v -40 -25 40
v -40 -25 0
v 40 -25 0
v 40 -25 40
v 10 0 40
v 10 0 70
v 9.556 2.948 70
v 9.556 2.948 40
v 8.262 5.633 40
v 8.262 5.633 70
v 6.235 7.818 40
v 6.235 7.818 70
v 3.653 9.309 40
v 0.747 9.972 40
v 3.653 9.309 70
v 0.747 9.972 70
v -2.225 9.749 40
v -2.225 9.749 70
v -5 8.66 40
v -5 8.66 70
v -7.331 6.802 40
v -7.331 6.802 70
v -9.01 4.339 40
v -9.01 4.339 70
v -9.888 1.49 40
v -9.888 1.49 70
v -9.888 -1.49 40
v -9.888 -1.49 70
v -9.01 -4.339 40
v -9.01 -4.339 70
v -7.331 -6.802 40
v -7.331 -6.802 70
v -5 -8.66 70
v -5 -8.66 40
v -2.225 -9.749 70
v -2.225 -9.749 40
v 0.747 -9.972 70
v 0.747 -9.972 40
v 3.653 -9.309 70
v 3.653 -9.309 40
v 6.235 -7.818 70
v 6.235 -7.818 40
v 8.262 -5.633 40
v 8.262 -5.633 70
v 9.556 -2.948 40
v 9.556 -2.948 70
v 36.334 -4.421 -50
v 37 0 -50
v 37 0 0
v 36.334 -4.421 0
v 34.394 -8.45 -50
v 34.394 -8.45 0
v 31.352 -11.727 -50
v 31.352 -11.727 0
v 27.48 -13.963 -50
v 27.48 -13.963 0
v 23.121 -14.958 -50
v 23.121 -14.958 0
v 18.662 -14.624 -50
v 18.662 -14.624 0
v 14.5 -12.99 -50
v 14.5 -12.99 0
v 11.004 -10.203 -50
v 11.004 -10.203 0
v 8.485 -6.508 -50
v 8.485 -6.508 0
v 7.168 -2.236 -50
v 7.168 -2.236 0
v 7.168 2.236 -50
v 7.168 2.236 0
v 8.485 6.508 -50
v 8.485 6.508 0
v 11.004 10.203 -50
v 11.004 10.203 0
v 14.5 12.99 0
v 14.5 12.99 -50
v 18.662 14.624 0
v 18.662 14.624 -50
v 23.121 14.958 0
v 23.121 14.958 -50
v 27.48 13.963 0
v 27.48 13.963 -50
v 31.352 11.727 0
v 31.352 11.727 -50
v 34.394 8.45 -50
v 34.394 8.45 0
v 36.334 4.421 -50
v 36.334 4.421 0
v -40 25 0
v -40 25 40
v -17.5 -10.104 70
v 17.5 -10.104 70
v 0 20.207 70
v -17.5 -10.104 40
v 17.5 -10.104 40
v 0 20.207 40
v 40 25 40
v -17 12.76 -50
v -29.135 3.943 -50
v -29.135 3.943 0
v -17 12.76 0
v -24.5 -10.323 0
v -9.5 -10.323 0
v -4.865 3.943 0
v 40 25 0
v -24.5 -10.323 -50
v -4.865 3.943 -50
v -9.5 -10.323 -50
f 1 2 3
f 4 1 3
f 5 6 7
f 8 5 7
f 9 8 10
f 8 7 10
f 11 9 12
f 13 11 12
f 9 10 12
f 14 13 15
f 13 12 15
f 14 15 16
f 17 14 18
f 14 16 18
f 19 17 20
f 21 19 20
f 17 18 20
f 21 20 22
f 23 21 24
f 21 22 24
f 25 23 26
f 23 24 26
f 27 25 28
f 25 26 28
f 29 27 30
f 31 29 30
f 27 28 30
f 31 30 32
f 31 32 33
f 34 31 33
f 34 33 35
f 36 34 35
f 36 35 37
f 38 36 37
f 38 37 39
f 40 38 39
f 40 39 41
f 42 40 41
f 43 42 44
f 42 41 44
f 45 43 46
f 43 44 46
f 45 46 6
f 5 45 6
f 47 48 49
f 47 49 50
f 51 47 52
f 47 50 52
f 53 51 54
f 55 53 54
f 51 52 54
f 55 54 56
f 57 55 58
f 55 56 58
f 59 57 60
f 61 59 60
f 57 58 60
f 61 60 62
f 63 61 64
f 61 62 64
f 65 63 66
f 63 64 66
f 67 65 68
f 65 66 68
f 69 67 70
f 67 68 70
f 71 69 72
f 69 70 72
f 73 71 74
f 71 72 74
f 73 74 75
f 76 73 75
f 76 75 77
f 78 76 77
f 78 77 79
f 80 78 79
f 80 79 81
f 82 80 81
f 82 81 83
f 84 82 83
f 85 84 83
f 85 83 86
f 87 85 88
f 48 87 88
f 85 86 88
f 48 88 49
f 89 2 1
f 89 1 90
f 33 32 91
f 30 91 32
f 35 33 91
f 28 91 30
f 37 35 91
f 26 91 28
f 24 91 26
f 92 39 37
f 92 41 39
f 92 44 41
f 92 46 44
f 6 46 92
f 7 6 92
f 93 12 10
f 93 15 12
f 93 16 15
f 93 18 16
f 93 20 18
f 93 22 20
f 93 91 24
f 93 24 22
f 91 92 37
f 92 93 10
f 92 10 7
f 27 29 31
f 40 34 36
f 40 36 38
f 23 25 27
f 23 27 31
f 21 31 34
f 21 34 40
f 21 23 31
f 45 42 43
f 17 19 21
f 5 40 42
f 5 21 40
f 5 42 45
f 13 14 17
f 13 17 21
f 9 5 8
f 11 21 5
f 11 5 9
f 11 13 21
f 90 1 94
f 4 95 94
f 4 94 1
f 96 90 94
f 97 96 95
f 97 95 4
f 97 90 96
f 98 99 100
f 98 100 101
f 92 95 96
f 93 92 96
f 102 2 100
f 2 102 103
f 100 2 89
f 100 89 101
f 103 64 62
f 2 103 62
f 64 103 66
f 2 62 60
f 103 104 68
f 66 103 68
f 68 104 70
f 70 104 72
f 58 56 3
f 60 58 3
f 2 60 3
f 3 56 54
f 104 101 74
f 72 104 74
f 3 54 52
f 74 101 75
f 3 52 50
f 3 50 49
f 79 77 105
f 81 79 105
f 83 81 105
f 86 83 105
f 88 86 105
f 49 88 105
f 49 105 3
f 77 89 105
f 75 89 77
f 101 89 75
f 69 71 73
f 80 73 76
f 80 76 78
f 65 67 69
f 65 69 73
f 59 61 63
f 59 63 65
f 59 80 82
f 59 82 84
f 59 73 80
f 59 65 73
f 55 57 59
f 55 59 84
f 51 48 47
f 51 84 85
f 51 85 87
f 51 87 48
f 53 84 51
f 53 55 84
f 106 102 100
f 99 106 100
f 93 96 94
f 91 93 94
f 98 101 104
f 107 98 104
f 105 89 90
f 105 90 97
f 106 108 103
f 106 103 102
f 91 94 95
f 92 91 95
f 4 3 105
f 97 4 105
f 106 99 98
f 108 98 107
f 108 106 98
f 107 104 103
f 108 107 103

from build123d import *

# Parameters (mm, degrees)
F0_W     = 80
F0_H     = 50
F1_DEPTH = 40
F3_DEPTH = 30
F4_R     = 10
F5_DEPTH = 30
F7_DEPTH = 50
F8_R     = 15
F9_DEPTH = 50


with BuildPart() as f1:
    # F0 (on Top) → F1 (new body)
    with BuildSketch(Plane.XY):
        Rectangle(F0_W, F0_H)
    extrude(amount=F1_DEPTH)

    # F2 (on face) → F3 (join)
    with BuildSketch(Plane.XY.offset(40)):
        Polygon((0, 20.207259), (-17.5, -10.10363), (17.5, -10.10363), align=None)
    extrude(amount=F3_DEPTH)

    # F4 (on face) → F5 (cut)
    with BuildSketch(Plane.XY.offset(70)):
        Circle(F4_R)
    extrude(amount=-F5_DEPTH, mode=Mode.SUBTRACT)

    # F6 (on face) → F7 (join)
    with BuildSketch(Plane(origin=(0, 0, 0), x_dir=(1, 0, 0), z_dir=(0, 0, -1))):
        Polygon((-9.5, 10.322864), (-24.5, 10.322864), (-29.135255, -3.942983), (-17, -12.759762), (-4.864745, -3.942983), align=None)
    extrude(amount=F7_DEPTH)

    # F8 (on face) → F9 (join)
    with BuildSketch(Plane(origin=(0, 0, 0), x_dir=(1, 0, 0), z_dir=(0, 0, -1))):
        with Locations((22, 0)):
            Circle(F8_R)
    extrude(amount=F9_DEPTH)


solid = f1.part
